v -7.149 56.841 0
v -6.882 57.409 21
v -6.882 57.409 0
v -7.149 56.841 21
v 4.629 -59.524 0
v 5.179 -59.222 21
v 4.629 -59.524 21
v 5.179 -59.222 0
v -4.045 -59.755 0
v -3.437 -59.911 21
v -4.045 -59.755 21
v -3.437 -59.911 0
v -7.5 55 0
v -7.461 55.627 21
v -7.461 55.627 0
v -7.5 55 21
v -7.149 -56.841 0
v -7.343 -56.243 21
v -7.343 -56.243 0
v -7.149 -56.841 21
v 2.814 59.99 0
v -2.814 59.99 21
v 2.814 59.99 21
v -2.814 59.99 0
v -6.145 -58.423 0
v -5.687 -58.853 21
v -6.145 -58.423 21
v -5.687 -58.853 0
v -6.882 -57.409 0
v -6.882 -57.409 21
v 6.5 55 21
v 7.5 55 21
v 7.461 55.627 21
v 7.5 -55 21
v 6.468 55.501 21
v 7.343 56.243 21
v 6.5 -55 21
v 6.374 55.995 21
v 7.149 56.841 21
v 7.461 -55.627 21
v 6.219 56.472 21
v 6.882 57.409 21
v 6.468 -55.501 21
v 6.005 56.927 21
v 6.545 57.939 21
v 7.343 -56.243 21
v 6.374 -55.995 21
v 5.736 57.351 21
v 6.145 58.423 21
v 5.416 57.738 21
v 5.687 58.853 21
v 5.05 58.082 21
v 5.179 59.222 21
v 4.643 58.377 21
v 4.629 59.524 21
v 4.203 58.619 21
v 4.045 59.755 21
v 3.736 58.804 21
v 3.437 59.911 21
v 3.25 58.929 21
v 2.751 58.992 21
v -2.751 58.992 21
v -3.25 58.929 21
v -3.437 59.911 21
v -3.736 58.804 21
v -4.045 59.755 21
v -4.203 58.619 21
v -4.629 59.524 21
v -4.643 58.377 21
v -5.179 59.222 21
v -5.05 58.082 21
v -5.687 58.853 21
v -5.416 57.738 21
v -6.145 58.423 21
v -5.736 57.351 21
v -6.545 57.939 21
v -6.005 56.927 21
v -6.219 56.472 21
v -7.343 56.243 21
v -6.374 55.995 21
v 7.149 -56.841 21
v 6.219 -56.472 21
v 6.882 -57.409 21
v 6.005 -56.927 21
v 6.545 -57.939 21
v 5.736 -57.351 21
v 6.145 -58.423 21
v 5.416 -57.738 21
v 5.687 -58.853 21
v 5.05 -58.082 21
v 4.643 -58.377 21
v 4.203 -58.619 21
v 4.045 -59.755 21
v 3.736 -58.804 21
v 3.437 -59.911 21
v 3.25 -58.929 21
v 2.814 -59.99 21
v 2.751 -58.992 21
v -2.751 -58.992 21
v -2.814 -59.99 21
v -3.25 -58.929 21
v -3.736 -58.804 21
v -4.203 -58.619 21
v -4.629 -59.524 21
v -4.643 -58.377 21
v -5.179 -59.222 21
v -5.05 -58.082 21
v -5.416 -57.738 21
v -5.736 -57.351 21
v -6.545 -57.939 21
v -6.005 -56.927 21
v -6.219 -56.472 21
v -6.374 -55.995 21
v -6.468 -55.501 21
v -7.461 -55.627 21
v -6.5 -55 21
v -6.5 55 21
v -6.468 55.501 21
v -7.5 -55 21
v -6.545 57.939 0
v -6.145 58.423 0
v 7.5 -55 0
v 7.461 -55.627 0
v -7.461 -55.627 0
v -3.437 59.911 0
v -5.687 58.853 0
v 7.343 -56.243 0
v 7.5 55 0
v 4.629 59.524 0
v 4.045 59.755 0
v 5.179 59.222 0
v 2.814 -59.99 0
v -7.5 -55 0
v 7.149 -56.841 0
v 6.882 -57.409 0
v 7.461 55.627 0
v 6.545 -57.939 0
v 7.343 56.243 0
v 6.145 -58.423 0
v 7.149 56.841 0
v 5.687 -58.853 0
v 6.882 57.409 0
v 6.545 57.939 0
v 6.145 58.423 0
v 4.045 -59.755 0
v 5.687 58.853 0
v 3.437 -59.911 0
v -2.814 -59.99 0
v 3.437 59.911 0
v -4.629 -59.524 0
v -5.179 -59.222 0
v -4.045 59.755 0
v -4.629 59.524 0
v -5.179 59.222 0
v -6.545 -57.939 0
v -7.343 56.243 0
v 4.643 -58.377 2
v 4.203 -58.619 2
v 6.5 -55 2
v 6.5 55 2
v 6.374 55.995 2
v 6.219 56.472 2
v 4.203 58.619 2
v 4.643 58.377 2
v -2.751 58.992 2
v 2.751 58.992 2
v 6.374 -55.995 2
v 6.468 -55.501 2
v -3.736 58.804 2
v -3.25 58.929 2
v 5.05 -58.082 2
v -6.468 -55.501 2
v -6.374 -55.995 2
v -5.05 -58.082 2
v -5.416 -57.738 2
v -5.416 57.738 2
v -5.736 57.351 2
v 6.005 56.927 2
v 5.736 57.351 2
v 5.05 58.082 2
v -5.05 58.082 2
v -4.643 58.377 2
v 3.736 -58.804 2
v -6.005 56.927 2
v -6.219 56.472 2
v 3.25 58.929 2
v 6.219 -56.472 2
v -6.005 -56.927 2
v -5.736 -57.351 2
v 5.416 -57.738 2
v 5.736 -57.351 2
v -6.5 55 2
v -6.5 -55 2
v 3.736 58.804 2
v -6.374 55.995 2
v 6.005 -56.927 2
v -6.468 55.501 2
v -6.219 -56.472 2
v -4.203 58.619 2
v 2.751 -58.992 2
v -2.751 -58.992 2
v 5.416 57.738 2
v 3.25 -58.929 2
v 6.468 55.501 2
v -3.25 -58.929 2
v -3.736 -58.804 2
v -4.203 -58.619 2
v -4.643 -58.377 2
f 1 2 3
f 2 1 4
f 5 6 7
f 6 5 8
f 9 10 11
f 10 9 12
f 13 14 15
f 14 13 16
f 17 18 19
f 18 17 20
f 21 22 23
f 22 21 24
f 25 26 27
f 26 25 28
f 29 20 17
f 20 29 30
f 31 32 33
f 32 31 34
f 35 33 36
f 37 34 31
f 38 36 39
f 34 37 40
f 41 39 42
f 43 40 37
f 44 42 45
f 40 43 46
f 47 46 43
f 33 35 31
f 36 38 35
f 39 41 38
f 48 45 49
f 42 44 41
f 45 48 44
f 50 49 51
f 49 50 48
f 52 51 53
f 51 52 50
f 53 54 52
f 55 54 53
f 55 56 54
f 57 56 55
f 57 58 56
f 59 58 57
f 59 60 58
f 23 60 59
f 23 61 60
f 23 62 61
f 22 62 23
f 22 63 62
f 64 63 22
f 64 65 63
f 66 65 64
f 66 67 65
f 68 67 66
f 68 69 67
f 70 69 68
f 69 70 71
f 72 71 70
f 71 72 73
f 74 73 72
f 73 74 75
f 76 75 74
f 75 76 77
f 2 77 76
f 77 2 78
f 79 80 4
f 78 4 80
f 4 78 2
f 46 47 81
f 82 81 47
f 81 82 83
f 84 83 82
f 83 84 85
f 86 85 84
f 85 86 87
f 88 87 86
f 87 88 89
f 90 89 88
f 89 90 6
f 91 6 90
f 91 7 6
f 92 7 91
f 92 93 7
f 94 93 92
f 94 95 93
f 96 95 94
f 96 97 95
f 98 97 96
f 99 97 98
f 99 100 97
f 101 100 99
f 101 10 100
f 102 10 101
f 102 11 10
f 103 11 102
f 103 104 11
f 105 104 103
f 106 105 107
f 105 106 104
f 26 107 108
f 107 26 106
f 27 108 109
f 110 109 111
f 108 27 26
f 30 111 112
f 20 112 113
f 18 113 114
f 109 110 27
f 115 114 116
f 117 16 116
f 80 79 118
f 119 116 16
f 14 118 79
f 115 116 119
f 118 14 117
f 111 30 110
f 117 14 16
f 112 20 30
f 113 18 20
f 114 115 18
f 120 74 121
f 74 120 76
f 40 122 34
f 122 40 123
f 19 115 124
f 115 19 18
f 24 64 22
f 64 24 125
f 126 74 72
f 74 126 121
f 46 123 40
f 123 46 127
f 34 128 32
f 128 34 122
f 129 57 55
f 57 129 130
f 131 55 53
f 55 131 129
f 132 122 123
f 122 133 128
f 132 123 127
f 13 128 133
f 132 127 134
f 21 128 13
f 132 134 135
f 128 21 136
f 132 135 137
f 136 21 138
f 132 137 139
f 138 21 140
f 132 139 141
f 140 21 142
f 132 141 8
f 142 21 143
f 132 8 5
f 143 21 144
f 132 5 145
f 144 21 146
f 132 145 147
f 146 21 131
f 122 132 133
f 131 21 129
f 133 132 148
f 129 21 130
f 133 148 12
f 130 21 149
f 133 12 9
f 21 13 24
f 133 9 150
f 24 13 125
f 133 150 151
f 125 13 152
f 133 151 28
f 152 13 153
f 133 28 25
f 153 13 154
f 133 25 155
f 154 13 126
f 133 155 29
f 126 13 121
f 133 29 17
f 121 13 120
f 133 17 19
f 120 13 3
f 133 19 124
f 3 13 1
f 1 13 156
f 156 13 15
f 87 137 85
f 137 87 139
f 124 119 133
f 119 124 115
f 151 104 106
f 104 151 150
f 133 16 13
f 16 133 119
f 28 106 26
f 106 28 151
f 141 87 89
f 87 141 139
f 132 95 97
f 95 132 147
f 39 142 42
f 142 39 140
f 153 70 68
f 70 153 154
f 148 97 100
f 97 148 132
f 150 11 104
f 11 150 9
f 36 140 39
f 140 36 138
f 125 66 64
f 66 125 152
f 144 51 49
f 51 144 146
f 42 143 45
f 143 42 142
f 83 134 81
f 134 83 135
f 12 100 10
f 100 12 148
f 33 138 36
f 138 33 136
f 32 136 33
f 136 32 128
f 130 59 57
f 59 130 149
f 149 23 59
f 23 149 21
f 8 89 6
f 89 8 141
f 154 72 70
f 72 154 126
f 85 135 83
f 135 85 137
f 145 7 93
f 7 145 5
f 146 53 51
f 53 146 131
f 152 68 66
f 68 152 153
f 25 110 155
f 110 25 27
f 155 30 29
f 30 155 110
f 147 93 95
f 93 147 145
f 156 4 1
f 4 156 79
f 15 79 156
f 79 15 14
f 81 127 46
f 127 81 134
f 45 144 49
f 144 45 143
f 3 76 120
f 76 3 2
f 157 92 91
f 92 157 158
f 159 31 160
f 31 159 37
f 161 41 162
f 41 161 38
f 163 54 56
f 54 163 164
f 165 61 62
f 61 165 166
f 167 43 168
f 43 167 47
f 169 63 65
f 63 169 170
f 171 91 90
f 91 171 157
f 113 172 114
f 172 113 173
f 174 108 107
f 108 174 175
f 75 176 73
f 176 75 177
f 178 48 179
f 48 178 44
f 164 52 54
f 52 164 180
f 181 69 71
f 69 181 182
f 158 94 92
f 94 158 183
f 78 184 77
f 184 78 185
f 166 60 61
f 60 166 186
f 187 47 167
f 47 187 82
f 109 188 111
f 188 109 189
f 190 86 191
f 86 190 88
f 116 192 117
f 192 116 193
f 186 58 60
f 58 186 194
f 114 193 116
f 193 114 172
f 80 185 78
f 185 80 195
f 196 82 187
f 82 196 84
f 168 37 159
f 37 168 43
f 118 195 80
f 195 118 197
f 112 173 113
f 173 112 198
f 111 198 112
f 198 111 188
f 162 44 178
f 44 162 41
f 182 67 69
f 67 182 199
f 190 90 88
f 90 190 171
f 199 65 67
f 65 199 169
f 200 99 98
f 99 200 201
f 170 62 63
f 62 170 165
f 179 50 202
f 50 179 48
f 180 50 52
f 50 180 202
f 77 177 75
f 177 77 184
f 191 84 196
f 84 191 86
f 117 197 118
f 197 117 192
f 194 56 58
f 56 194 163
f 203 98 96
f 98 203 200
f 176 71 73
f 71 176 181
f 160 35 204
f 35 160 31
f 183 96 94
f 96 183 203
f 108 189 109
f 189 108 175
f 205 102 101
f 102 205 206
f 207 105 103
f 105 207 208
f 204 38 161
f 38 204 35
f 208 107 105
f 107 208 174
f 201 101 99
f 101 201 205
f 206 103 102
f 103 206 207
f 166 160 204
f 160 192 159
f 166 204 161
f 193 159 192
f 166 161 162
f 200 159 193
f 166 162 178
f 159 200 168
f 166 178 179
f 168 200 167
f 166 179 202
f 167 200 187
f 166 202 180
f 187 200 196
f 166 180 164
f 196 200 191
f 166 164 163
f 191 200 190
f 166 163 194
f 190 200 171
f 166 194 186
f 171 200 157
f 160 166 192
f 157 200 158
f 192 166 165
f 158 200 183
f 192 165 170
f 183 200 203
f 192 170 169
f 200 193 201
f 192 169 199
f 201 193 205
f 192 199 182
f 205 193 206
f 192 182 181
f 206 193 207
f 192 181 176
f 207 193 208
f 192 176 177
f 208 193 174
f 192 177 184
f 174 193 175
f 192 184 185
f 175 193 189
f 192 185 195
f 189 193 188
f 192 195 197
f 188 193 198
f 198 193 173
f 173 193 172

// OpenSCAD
$fn = 50;


difference() {
	union() {
		hull() {
			translate(v = [-2.5000000000, 55.0000000000, 0]) {
				cylinder(h = 21, r = 5);
			}
			translate(v = [2.5000000000, 55.0000000000, 0]) {
				cylinder(h = 21, r = 5);
			}
			translate(v = [-2.5000000000, -55.0000000000, 0]) {
				cylinder(h = 21, r = 5);
			}
			translate(v = [2.5000000000, -55.0000000000, 0]) {
				cylinder(h = 21, r = 5);
			}
		}
	}
	union() {
		translate(v = [0, 0, 2]) {
			hull() {
				translate(v = [-2.5000000000, 55.0000000000, 0]) {
					cylinder(h = 19, r = 4);
				}
				translate(v = [2.5000000000, 55.0000000000, 0]) {
					cylinder(h = 19, r = 4);
				}
				translate(v = [-2.5000000000, -55.0000000000, 0]) {
					cylinder(h = 19, r = 4);
				}
				translate(v = [2.5000000000, -55.0000000000, 0]) {
					cylinder(h = 19, r = 4);
				}
			}
		}
	}
}
